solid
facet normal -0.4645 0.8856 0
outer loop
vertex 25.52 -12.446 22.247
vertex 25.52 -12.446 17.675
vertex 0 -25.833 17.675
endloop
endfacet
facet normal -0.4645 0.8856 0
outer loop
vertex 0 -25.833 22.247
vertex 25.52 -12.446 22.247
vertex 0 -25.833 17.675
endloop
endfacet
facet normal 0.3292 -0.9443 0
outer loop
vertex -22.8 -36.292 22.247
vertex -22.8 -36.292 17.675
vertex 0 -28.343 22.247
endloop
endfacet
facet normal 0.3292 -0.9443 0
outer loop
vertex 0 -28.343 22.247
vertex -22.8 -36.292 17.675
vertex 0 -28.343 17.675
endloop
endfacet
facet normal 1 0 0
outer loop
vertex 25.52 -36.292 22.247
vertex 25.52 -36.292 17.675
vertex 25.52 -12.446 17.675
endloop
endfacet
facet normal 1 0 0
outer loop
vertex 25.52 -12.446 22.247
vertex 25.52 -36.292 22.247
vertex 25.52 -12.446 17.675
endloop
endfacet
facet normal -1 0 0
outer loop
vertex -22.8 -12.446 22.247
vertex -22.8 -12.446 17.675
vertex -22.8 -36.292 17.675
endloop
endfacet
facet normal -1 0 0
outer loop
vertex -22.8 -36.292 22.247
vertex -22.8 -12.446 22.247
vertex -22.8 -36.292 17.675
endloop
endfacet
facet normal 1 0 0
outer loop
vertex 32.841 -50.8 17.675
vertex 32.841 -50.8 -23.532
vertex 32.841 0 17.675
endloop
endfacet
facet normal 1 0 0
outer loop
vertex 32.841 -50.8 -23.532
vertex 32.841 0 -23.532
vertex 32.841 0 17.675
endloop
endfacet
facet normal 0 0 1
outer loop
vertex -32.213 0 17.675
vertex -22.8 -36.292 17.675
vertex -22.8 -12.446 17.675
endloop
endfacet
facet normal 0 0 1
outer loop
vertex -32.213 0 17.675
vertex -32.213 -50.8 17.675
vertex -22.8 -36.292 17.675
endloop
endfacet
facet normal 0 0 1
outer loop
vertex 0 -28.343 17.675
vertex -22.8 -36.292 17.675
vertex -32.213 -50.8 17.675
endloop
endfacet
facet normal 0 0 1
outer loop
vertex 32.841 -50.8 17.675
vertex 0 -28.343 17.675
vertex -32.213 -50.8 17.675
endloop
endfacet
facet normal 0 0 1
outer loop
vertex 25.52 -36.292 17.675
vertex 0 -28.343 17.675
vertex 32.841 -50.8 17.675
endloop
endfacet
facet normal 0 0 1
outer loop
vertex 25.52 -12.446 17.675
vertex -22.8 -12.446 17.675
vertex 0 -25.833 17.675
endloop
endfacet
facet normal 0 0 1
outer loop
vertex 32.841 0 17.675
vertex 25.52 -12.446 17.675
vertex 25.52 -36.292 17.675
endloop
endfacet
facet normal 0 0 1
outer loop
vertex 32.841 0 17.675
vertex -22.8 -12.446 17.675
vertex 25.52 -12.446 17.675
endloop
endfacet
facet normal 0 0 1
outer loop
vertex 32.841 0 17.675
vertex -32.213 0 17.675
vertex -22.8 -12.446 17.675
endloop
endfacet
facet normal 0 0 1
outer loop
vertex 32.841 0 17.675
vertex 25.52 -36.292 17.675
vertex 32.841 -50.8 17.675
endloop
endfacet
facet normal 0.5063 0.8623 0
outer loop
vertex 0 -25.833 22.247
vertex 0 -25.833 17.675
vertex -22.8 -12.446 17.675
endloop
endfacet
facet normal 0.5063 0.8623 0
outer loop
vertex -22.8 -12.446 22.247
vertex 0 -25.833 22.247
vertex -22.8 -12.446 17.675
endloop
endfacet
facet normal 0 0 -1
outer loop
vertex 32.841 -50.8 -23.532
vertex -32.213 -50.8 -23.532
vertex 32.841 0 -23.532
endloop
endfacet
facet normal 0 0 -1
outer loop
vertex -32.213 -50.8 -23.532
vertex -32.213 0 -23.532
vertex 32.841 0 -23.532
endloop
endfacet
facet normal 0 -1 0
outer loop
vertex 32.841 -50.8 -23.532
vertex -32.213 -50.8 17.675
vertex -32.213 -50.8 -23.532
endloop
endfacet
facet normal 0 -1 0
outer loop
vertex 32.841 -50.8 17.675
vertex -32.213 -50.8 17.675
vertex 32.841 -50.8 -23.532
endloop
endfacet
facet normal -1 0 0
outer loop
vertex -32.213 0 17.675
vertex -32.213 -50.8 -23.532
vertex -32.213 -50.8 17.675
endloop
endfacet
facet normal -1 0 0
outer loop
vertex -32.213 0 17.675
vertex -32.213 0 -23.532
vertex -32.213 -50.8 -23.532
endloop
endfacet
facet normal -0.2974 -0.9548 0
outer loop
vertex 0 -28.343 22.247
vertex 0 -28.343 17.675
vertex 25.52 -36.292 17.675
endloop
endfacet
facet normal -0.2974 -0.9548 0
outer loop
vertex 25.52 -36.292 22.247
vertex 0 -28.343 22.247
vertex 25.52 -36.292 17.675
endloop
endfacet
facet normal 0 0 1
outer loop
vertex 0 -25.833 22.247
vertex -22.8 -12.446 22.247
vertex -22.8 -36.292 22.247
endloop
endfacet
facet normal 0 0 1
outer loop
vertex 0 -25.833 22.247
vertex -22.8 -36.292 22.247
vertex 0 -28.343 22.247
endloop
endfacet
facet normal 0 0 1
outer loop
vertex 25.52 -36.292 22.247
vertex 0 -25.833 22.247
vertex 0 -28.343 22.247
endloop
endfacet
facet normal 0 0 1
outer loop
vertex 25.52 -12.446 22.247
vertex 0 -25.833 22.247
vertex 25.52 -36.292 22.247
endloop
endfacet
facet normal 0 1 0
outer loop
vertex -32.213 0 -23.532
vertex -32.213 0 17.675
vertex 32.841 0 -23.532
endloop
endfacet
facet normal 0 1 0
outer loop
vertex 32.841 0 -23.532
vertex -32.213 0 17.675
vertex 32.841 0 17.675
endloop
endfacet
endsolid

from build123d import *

# Parameters (mm, degrees)
F0_W     = 65.05388394
F0_H     = 41.2077661604
F1_DEPTH = 25.4
F2_W     = 65.05388394
F2_H     = 41.2077661604
F3_DEPTH = 25.4
F5_DEPTH = 4.572


with BuildPart() as f1:
    # F0 (on Front) → F1 (new body)
    with BuildSketch(Plane.XZ):
        with Locations((0.313764438, -2.9284702614)):
            Rectangle(F0_W, F0_H)
    extrude(amount=F1_DEPTH)

    # F2 (on face) → F3 (join)
    with BuildSketch(Plane.XZ.offset(25.4)):
        with Locations((0.313764438, -2.9284702614)):
            Rectangle(F2_W, F2_H)
        Polygon((-23.4277658165, -9.0991770849), (-23.4277658165, 2.8238825034), (0, -3.2422353979), align=None, mode=Mode.SUBTRACT)
        Polygon((20.9176484495, -9.0991770849), (0, -3.2422353979), (20.9176484495, 2.8238825034), align=None, mode=Mode.SUBTRACT)
        Polygon((0, -3.2422353979), (-23.4277658165, 2.8238825034), (-23.4277658165, -9.0991770849), align=None)
        Polygon((20.9176484495, 2.8238825034), (0, -3.2422353979), (20.9176484495, -9.0991770849), align=None)
    extrude(amount=F3_DEPTH)

    # F4 (on face) → F5 (join)
    with BuildSketch(Plane.XY.offset(17.6754128188)):
        Polygon((0, -25.8332956582), (-22.8002350777, -12.4460002407), (-22.8002350777, -36.292117089), (0, -28.3434130251), (25.5195293576, -36.292117089), (25.5195293576, -12.4460002407), align=None)
    extrude(amount=F5_DEPTH)


solid = f1.part
